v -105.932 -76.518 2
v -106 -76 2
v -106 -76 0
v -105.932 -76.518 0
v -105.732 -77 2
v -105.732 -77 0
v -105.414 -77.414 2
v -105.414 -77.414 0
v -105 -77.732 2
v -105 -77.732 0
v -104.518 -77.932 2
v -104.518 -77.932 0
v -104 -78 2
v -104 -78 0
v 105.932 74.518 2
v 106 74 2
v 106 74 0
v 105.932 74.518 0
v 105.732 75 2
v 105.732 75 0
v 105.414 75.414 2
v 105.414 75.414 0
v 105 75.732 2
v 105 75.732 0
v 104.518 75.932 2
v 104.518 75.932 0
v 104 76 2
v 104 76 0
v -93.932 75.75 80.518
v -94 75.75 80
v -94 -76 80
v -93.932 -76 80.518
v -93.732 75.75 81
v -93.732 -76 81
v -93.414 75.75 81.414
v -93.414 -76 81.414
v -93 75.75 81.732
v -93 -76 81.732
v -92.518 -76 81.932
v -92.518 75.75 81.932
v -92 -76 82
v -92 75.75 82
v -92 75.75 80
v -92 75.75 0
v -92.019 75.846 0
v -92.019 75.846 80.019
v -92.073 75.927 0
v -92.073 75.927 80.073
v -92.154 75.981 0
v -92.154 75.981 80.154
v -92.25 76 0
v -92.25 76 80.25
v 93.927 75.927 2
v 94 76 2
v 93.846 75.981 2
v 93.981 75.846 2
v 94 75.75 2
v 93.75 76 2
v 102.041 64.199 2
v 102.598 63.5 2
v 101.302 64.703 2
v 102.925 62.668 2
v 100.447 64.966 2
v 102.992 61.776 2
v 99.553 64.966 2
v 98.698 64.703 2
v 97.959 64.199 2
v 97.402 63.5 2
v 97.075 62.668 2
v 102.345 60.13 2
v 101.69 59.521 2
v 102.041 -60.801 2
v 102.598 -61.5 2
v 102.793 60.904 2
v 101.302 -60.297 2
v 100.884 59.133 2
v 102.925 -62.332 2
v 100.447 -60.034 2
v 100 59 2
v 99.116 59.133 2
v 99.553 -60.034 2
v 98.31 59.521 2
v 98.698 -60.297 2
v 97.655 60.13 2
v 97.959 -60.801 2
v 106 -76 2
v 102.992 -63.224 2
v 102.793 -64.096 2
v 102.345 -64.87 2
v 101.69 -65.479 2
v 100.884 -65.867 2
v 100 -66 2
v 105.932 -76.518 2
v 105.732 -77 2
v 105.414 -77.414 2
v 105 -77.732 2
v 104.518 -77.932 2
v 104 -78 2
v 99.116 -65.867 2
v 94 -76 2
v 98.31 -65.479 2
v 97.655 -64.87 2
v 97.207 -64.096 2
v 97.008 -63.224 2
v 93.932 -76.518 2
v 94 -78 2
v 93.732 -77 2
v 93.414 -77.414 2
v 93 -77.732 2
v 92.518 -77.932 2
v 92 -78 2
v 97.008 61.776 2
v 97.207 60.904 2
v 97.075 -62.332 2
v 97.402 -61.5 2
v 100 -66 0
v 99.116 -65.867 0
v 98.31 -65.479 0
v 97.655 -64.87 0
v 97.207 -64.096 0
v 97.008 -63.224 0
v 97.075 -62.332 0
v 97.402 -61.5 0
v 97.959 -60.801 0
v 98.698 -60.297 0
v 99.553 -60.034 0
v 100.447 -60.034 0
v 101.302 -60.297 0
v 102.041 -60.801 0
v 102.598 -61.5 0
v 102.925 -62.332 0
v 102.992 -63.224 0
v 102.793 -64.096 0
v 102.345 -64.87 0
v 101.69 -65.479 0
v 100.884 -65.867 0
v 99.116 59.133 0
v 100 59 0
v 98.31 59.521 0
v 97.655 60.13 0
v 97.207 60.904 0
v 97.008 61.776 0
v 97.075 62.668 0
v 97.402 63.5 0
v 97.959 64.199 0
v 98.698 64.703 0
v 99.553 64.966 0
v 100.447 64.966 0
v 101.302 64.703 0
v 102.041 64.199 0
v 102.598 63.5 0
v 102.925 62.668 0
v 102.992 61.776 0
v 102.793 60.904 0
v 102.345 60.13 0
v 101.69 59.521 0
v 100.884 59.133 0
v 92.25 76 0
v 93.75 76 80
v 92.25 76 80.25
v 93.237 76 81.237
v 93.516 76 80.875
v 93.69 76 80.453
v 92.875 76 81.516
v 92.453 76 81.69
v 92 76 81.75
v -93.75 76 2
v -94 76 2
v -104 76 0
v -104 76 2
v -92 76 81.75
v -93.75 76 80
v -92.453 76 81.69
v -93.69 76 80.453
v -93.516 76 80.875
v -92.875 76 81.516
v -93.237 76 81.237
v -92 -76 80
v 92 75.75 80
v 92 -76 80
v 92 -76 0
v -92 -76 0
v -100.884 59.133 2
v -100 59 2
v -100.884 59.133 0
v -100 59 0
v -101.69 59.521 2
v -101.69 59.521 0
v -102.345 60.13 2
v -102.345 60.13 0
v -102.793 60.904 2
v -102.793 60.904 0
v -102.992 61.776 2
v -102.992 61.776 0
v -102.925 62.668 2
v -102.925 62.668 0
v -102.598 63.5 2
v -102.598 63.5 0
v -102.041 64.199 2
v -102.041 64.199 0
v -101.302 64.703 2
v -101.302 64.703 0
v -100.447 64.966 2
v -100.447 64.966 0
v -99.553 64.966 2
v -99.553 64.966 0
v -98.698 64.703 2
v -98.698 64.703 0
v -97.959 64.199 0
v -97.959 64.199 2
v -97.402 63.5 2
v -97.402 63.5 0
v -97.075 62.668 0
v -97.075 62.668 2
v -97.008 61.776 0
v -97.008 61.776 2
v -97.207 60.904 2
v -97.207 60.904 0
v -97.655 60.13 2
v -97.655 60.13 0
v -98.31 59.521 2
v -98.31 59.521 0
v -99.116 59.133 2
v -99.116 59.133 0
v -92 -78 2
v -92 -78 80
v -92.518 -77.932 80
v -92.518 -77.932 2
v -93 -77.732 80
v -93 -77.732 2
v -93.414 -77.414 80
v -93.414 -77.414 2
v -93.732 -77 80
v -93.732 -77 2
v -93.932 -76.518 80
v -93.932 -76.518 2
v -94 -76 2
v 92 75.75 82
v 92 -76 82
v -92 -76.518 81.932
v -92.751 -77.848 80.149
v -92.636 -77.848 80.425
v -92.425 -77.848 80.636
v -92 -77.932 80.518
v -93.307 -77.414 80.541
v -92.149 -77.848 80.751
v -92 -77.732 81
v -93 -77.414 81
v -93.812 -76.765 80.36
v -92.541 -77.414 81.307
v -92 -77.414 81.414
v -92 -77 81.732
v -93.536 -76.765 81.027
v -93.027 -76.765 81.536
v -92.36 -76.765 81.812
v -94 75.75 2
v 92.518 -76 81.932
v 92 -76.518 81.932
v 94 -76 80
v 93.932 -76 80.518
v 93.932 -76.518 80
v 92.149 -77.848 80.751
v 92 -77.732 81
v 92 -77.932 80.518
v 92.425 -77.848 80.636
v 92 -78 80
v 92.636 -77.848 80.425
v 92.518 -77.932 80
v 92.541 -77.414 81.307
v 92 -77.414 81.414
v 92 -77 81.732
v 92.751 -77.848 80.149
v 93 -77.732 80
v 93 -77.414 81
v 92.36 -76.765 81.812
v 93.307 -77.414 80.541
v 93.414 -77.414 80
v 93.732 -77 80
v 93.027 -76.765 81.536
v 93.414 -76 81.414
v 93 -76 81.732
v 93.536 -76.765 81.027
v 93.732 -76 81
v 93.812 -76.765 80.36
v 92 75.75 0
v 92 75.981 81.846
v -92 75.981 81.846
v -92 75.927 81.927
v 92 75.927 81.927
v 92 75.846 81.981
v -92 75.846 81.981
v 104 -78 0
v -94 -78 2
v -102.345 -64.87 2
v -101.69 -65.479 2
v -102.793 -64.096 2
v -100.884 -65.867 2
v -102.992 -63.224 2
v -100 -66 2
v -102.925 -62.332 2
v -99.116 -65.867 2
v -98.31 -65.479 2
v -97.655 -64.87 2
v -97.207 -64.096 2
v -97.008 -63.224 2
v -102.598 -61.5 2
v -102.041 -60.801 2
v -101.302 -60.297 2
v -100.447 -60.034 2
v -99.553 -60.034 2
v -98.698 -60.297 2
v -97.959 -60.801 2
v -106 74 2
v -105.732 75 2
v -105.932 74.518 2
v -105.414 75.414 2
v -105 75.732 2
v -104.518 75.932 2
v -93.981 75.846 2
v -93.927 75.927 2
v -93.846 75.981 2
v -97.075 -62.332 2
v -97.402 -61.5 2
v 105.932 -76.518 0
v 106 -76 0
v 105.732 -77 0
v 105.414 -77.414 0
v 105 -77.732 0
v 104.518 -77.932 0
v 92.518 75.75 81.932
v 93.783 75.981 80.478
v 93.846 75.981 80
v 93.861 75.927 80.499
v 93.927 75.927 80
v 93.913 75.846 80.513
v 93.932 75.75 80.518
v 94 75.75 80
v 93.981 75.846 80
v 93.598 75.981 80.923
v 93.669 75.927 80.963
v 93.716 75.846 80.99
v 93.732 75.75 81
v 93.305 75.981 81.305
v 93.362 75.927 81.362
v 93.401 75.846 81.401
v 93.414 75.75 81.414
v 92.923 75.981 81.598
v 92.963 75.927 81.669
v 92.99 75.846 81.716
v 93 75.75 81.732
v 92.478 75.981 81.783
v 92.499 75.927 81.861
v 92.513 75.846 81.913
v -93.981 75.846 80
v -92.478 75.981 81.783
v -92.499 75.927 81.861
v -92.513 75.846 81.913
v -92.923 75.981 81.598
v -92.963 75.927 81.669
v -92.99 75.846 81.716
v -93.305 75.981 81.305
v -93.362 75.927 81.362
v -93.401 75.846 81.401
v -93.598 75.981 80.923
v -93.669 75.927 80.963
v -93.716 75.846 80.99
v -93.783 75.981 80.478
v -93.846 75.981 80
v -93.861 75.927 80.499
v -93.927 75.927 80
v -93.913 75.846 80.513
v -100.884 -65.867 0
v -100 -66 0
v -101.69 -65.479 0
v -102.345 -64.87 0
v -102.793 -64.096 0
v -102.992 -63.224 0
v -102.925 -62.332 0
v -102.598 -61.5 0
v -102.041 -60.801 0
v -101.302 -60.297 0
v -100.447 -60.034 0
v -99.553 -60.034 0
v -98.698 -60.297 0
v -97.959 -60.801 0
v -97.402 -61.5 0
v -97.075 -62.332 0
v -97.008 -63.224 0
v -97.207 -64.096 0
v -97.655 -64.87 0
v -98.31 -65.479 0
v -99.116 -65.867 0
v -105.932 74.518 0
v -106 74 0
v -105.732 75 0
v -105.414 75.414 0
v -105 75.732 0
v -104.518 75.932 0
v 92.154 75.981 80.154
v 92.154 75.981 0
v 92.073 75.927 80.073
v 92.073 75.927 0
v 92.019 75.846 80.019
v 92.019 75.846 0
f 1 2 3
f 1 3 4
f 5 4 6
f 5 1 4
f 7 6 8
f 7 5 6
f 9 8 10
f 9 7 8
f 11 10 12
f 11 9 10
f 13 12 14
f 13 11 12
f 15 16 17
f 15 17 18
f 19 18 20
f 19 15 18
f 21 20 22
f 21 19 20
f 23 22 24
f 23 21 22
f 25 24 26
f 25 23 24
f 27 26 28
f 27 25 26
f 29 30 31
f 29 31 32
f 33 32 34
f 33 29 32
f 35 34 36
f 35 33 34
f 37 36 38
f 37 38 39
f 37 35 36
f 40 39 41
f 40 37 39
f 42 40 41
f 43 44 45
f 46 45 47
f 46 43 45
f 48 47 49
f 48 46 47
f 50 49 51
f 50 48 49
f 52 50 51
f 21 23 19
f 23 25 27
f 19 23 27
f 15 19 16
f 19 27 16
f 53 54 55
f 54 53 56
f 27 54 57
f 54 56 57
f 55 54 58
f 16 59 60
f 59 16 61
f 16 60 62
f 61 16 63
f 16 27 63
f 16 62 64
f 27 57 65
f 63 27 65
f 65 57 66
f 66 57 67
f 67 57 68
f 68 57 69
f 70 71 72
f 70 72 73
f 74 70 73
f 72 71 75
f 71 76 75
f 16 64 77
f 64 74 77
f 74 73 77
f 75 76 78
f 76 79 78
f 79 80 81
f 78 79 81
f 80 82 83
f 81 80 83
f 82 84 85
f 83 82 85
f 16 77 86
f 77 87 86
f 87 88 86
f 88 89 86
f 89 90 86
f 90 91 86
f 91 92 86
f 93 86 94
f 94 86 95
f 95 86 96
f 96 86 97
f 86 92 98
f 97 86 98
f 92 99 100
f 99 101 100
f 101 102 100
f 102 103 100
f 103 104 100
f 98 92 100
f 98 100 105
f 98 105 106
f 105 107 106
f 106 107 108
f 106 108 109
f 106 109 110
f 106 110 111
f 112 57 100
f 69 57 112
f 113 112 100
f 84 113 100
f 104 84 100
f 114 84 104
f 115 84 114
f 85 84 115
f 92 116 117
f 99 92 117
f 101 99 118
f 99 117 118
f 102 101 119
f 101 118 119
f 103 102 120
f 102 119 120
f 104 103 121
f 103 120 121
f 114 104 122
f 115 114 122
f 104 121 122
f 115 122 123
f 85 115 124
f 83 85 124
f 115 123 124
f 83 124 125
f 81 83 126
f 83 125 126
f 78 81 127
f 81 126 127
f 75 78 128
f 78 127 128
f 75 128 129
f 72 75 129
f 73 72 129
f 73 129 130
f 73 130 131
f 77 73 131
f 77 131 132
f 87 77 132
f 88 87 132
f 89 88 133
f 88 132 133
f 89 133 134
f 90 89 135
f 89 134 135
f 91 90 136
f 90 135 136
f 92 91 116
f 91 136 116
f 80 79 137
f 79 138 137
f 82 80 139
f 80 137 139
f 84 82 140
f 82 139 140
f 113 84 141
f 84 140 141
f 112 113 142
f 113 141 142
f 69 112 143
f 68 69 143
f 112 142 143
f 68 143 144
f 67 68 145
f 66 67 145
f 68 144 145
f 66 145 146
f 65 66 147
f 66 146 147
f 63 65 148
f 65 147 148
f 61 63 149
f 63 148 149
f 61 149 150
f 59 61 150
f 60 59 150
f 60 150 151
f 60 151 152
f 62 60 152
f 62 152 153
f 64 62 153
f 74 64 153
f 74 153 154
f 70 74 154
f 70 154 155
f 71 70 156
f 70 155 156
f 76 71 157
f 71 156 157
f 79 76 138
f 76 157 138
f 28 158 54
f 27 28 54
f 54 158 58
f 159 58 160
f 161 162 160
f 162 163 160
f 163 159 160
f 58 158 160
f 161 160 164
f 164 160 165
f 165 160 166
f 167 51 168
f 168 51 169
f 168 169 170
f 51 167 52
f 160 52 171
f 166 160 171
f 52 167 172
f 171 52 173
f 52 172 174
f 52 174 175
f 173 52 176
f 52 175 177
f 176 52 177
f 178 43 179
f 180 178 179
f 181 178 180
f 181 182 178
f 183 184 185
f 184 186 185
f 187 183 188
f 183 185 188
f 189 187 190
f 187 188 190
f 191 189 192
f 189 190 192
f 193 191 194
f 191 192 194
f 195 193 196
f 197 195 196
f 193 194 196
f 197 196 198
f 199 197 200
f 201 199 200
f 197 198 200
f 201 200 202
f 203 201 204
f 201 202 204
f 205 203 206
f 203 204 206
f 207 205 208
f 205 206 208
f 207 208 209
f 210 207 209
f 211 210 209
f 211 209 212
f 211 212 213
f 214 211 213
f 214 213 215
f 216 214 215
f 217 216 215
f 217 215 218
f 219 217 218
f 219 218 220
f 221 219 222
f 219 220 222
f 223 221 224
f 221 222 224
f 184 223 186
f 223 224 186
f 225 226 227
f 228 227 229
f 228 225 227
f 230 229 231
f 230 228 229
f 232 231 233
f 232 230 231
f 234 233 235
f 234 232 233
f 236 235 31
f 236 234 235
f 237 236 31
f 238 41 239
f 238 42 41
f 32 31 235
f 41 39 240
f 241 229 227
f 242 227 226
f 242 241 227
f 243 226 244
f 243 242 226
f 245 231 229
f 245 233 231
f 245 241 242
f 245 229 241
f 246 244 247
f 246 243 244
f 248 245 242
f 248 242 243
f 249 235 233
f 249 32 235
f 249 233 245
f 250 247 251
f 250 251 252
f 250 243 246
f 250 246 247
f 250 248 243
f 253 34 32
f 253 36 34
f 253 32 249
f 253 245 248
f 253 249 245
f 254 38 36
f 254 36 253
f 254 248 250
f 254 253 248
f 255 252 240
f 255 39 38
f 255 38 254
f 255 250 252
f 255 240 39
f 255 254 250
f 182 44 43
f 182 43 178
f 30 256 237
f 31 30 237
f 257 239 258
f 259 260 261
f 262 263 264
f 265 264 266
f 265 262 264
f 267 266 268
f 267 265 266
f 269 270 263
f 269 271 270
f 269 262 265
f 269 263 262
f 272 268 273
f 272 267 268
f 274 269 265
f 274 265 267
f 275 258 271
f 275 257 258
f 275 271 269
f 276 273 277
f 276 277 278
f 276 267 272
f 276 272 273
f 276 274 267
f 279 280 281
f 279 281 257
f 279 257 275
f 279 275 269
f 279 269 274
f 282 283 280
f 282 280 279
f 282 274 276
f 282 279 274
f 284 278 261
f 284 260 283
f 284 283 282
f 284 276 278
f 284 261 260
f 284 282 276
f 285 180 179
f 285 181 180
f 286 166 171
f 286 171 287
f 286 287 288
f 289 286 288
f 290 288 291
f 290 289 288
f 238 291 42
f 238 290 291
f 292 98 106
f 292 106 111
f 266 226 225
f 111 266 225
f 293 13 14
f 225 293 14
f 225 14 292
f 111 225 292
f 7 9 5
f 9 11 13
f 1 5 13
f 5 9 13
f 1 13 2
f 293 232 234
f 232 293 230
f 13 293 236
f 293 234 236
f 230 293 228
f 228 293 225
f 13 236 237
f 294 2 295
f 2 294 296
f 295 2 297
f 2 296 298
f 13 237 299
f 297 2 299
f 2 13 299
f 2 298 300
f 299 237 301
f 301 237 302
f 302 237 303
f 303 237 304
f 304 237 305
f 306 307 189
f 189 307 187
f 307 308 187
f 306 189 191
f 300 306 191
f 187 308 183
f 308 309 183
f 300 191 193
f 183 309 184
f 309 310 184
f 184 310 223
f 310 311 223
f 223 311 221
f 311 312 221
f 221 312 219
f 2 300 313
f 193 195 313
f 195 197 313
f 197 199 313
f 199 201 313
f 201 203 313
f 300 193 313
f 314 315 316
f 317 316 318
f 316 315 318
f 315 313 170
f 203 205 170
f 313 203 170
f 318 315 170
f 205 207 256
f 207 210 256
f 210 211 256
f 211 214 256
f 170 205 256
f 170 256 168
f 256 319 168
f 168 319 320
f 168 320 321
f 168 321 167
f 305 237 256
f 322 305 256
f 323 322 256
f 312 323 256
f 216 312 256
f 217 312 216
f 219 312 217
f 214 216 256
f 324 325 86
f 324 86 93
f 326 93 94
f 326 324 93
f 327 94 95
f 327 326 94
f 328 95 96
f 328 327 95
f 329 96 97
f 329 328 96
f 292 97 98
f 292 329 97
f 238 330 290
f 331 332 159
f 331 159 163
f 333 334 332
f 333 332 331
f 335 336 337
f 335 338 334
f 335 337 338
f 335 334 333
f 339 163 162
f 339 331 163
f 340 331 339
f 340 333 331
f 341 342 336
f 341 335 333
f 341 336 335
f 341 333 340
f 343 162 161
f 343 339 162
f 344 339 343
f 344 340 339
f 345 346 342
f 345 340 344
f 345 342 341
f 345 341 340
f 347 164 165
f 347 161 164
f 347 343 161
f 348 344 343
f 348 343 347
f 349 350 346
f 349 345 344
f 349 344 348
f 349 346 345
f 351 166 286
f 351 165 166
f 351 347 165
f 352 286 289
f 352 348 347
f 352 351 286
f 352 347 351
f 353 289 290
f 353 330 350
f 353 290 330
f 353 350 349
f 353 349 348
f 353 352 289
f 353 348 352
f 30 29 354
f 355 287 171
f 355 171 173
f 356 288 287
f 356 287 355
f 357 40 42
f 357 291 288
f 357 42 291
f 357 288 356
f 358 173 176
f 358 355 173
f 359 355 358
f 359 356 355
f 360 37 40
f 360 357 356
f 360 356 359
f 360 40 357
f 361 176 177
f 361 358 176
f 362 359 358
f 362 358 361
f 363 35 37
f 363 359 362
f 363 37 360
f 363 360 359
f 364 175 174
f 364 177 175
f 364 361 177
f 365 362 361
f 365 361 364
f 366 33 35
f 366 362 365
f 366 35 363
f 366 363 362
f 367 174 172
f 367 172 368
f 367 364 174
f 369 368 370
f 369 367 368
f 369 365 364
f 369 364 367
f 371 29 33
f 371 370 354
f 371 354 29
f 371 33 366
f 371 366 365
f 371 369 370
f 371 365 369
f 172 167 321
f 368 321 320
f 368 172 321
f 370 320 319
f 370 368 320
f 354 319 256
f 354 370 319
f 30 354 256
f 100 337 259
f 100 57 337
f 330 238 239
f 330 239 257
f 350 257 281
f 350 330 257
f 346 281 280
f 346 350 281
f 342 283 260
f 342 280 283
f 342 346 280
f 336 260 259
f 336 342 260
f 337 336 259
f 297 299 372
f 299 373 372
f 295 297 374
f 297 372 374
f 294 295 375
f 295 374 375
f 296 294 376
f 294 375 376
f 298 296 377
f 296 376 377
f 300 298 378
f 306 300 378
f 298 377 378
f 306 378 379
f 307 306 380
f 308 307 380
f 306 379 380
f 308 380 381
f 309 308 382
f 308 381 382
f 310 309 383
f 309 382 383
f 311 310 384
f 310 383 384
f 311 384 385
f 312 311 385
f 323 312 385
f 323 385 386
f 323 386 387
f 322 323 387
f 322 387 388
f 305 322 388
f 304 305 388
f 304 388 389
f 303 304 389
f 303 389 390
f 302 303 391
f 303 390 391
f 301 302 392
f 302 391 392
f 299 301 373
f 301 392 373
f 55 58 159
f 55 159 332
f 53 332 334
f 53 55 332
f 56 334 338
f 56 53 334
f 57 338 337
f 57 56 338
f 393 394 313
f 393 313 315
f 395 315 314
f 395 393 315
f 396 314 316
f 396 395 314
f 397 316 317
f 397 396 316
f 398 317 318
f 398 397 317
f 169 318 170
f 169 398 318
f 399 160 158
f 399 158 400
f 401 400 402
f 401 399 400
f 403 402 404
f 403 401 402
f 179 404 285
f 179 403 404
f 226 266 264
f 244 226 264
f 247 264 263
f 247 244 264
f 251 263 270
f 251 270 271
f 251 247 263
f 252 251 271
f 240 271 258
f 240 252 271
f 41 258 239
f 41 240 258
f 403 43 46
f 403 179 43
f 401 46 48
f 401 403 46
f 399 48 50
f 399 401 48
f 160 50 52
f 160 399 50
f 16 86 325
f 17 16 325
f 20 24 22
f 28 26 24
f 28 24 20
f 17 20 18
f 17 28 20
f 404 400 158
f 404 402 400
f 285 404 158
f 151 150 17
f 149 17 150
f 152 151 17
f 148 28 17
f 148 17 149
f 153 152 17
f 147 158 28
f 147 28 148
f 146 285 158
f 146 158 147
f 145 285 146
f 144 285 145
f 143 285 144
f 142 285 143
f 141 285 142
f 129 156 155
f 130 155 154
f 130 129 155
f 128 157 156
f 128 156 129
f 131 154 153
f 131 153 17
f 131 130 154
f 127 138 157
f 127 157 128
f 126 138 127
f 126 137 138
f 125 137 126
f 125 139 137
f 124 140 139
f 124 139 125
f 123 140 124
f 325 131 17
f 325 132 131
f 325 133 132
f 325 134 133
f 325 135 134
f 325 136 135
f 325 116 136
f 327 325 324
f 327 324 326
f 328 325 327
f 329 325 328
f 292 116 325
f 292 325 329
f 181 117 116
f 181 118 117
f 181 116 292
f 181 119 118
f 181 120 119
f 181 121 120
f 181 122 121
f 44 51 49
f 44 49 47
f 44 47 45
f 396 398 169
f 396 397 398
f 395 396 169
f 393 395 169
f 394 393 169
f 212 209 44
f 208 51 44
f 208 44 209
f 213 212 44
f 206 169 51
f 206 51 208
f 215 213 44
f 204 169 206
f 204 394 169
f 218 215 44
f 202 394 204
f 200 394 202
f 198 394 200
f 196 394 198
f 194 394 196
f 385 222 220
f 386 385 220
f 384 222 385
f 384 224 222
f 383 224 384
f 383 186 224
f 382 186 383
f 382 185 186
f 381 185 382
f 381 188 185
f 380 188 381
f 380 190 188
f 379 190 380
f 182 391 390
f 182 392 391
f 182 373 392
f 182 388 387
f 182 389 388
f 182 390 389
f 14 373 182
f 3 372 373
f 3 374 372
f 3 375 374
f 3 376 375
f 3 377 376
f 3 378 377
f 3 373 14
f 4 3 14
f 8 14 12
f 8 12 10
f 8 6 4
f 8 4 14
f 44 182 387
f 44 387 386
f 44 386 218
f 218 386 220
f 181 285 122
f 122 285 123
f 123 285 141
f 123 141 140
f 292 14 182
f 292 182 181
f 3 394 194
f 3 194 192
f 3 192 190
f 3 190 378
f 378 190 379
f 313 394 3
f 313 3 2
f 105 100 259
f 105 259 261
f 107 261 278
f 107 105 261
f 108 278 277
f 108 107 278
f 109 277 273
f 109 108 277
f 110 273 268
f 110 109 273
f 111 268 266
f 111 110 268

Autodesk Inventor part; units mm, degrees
ref_plane "YZ Plane" through (0, 0, 0) normal (1, 0, 0) x (0, 1, 0)
ref_plane "XZ Plane" through (0, 0, 0) normal (0, 1, 0) x (-1, 0, 0)
ref_plane "XY Plane" through (0, 0, 0) normal (0, 0, 1) x (1, 0, 0)
sketch "Sketch1" plane through (0, 0, 0) normal (0, 0, 1) x (1, 0, 0)
  line L0 (-92, -76) -> (92, -76)
  line L1 (92, -76) -> (92, 76)
  line L2 (92, 76) -> (-92, 76) construction
  line L3 (-92, 76) -> (-92, -76)
  line L4 (-92, -76) -> (92, 76) construction
  line L5 (92, -76) -> (-92, 76) construction
  line L6 (-92, -76) -> (-94, -76) construction
  line L7 (-92, 76) -> (-94, 76) construction
  line L8 (-92, -76) -> (-92, -78) construction
  line L9 (-94, 76) -> (-94, -78)
  line L10 (92, -76) -> (94, -76) construction
  line L11 (92, -76) -> (92, -78) construction
  line L12 (92, 76) -> (94, 76) construction
  line L13 (94, 76) -> (94, -78)
  line L14 (94, -78) -> (-94, -78)
  line L15 (-94, 76) -> (-92, 76)
  line L16 (92, 76) -> (94, 76)
  point P0 (0, 0)
  dimension "d0" = 184
  dimension "d1" = 152
  dimension "d2" = 2
  dimension "d3" = 2
  dimension "d4" = 2
  dimension "d5" = 2
  dimension "d6" = 2
  dimension "d7" = 2
  dimension "d8" = 2
extrude "Extrusion1" add sketch "Sketch1" along normal blind 80
sketch "Sketch2" plane through (0, 0, 80) normal (0, 0, 1) x (1, 0, 0)
  line L0 (92, -76) -> (-92, -76) construction
  line L1 (-92, -76) -> (-92, 76) construction
  line L2 (-92, 76) -> (-94, 76) construction
  line L3 (-94, 76) -> (-94, -78) construction
  line L4 (-94, -78) -> (94, -78) construction
  line L5 (94, -78) -> (94, 76) construction
  line L6 (94, 76) -> (92, 76) construction
  line L7 (92, 76) -> (92, -76) construction
  line L8 (-94, -78) -> (-94, 76) projected
  line L9 (94, -78) -> (94, 76) projected
  line L10 (-94, 76) -> (94, 76)
  line L11 (94, 76) -> (94, -78)
  line L12 (94, -78) -> (-94, -78)
  line L13 (-94, -78) -> (-94, 76)
  point P0 (0, 0)
extrude "Extrusion2" add sketch "Sketch2" along normal blind 2
sketch "Sketch3" plane through (-94, -78, 0) normal (-1, 0, 0) x (0, 0, 1)
  line L0 (0, 0) -> (0, 154) construction
  line L1 (0, 0) -> (82, 0) construction
  line L2 (82, 154) -> (82, 0) construction
  line L3 (0, 154) -> (82, 154) construction
  line L4 (0, 154) -> (80, 154) construction
  line L5 (0, 0) -> (2, 0)
  line L6 (2, 0) -> (2, 154)
  line L7 (2, 154) -> (0, 154)
  line L8 (0, 154) -> (0, 0)
  point P0 (0, 78)
  dimension "d13" = 2
extrude "Extrusion3" add sketch "Sketch3" along normal blind 12
sketch "Sketch4" plane through (94, -78, 0) normal (1, 0, 0) x (0, 0, -1)
  line L0 (0, 154) -> (0, 0) construction
  line L1 (0, 154) -> (-82, 154) construction
  line L2 (-82, 0) -> (-82, 154) construction
  line L3 (0, 0) -> (-82, 0) construction
  line L4 (0, 154) -> (0, 2) projected
  line L5 (-2, 0) -> (-82, 0) construction
  line L6 (0, 154) -> (-2, 154)
  line L7 (-2, 154) -> (-2, 0)
  line L8 (-2, 0) -> (0, 0)
  line L9 (0, 0) -> (0, 154)
  point P0 (0, 78)
extrude "Extrusion4" add sketch "Sketch4" along normal blind 12
sketch "Sketch5" plane through (-94, -78, 2) normal (0, 0, 1) x (1, 0, 0)
  circle A0 centre (-6, 15) radius 3 construction
  line L0 (0, 154) -> (0, 0) construction
  line L1 (0, 154) -> (-12, 154) construction
  line L2 (-12, 0) -> (-12, 154) construction
  line L3 (0, 0) -> (-12, 0) construction
  circle A1 centre (-6, 140) radius 3 construction
  line L4 (188, 154) -> (0, 154) construction
  line L5 (0, 154) -> (0, 0) construction
  line L6 (0, 0) -> (188, 0) construction
  line L7 (188, 0) -> (188, 154) construction
  line L8 (188, 154) -> (0, 154) construction
  line L9 (94, 154) -> (94, 2) construction
  line L10 (2, 2) -> (186, 2) construction
  circle A2 centre (194, 15) radius 3 construction
  circle A3 centre (194, 140) radius 3 construction
  point P0 (94, 78)
  dimension "d18" = 6
  dimension "d19" = 15
  dimension "d23" = 6
  dimension "d24" = 125
  dimension "d25" = 100
hole "Hole1" at (-100, 62, 2) at (-100, -63, 2) at (100, -63, 2) at (100, 62, 2) direction (0, 0, -1) diameter 6 end through all
fillet "Fillet1" radius 2 9 edges at (-106, 76, 1) (-106, -78, 1) (106, -78, 1) (106, 76, 1) (94, -1, 82) (-94, -1, 82) (-94, -78, 42) (94, -78, 42) (0, -78, 82)
fillet "Fillet1" radius 0.25 6 edges at (0, 76, 80) (92, 76, 40) (-92, 76, 40) (-94, 76, 42) (0, 76, 82) (94, 76, 42)
properties part number "BatteryBox_NP1812" material "Steel, Galvanized"
